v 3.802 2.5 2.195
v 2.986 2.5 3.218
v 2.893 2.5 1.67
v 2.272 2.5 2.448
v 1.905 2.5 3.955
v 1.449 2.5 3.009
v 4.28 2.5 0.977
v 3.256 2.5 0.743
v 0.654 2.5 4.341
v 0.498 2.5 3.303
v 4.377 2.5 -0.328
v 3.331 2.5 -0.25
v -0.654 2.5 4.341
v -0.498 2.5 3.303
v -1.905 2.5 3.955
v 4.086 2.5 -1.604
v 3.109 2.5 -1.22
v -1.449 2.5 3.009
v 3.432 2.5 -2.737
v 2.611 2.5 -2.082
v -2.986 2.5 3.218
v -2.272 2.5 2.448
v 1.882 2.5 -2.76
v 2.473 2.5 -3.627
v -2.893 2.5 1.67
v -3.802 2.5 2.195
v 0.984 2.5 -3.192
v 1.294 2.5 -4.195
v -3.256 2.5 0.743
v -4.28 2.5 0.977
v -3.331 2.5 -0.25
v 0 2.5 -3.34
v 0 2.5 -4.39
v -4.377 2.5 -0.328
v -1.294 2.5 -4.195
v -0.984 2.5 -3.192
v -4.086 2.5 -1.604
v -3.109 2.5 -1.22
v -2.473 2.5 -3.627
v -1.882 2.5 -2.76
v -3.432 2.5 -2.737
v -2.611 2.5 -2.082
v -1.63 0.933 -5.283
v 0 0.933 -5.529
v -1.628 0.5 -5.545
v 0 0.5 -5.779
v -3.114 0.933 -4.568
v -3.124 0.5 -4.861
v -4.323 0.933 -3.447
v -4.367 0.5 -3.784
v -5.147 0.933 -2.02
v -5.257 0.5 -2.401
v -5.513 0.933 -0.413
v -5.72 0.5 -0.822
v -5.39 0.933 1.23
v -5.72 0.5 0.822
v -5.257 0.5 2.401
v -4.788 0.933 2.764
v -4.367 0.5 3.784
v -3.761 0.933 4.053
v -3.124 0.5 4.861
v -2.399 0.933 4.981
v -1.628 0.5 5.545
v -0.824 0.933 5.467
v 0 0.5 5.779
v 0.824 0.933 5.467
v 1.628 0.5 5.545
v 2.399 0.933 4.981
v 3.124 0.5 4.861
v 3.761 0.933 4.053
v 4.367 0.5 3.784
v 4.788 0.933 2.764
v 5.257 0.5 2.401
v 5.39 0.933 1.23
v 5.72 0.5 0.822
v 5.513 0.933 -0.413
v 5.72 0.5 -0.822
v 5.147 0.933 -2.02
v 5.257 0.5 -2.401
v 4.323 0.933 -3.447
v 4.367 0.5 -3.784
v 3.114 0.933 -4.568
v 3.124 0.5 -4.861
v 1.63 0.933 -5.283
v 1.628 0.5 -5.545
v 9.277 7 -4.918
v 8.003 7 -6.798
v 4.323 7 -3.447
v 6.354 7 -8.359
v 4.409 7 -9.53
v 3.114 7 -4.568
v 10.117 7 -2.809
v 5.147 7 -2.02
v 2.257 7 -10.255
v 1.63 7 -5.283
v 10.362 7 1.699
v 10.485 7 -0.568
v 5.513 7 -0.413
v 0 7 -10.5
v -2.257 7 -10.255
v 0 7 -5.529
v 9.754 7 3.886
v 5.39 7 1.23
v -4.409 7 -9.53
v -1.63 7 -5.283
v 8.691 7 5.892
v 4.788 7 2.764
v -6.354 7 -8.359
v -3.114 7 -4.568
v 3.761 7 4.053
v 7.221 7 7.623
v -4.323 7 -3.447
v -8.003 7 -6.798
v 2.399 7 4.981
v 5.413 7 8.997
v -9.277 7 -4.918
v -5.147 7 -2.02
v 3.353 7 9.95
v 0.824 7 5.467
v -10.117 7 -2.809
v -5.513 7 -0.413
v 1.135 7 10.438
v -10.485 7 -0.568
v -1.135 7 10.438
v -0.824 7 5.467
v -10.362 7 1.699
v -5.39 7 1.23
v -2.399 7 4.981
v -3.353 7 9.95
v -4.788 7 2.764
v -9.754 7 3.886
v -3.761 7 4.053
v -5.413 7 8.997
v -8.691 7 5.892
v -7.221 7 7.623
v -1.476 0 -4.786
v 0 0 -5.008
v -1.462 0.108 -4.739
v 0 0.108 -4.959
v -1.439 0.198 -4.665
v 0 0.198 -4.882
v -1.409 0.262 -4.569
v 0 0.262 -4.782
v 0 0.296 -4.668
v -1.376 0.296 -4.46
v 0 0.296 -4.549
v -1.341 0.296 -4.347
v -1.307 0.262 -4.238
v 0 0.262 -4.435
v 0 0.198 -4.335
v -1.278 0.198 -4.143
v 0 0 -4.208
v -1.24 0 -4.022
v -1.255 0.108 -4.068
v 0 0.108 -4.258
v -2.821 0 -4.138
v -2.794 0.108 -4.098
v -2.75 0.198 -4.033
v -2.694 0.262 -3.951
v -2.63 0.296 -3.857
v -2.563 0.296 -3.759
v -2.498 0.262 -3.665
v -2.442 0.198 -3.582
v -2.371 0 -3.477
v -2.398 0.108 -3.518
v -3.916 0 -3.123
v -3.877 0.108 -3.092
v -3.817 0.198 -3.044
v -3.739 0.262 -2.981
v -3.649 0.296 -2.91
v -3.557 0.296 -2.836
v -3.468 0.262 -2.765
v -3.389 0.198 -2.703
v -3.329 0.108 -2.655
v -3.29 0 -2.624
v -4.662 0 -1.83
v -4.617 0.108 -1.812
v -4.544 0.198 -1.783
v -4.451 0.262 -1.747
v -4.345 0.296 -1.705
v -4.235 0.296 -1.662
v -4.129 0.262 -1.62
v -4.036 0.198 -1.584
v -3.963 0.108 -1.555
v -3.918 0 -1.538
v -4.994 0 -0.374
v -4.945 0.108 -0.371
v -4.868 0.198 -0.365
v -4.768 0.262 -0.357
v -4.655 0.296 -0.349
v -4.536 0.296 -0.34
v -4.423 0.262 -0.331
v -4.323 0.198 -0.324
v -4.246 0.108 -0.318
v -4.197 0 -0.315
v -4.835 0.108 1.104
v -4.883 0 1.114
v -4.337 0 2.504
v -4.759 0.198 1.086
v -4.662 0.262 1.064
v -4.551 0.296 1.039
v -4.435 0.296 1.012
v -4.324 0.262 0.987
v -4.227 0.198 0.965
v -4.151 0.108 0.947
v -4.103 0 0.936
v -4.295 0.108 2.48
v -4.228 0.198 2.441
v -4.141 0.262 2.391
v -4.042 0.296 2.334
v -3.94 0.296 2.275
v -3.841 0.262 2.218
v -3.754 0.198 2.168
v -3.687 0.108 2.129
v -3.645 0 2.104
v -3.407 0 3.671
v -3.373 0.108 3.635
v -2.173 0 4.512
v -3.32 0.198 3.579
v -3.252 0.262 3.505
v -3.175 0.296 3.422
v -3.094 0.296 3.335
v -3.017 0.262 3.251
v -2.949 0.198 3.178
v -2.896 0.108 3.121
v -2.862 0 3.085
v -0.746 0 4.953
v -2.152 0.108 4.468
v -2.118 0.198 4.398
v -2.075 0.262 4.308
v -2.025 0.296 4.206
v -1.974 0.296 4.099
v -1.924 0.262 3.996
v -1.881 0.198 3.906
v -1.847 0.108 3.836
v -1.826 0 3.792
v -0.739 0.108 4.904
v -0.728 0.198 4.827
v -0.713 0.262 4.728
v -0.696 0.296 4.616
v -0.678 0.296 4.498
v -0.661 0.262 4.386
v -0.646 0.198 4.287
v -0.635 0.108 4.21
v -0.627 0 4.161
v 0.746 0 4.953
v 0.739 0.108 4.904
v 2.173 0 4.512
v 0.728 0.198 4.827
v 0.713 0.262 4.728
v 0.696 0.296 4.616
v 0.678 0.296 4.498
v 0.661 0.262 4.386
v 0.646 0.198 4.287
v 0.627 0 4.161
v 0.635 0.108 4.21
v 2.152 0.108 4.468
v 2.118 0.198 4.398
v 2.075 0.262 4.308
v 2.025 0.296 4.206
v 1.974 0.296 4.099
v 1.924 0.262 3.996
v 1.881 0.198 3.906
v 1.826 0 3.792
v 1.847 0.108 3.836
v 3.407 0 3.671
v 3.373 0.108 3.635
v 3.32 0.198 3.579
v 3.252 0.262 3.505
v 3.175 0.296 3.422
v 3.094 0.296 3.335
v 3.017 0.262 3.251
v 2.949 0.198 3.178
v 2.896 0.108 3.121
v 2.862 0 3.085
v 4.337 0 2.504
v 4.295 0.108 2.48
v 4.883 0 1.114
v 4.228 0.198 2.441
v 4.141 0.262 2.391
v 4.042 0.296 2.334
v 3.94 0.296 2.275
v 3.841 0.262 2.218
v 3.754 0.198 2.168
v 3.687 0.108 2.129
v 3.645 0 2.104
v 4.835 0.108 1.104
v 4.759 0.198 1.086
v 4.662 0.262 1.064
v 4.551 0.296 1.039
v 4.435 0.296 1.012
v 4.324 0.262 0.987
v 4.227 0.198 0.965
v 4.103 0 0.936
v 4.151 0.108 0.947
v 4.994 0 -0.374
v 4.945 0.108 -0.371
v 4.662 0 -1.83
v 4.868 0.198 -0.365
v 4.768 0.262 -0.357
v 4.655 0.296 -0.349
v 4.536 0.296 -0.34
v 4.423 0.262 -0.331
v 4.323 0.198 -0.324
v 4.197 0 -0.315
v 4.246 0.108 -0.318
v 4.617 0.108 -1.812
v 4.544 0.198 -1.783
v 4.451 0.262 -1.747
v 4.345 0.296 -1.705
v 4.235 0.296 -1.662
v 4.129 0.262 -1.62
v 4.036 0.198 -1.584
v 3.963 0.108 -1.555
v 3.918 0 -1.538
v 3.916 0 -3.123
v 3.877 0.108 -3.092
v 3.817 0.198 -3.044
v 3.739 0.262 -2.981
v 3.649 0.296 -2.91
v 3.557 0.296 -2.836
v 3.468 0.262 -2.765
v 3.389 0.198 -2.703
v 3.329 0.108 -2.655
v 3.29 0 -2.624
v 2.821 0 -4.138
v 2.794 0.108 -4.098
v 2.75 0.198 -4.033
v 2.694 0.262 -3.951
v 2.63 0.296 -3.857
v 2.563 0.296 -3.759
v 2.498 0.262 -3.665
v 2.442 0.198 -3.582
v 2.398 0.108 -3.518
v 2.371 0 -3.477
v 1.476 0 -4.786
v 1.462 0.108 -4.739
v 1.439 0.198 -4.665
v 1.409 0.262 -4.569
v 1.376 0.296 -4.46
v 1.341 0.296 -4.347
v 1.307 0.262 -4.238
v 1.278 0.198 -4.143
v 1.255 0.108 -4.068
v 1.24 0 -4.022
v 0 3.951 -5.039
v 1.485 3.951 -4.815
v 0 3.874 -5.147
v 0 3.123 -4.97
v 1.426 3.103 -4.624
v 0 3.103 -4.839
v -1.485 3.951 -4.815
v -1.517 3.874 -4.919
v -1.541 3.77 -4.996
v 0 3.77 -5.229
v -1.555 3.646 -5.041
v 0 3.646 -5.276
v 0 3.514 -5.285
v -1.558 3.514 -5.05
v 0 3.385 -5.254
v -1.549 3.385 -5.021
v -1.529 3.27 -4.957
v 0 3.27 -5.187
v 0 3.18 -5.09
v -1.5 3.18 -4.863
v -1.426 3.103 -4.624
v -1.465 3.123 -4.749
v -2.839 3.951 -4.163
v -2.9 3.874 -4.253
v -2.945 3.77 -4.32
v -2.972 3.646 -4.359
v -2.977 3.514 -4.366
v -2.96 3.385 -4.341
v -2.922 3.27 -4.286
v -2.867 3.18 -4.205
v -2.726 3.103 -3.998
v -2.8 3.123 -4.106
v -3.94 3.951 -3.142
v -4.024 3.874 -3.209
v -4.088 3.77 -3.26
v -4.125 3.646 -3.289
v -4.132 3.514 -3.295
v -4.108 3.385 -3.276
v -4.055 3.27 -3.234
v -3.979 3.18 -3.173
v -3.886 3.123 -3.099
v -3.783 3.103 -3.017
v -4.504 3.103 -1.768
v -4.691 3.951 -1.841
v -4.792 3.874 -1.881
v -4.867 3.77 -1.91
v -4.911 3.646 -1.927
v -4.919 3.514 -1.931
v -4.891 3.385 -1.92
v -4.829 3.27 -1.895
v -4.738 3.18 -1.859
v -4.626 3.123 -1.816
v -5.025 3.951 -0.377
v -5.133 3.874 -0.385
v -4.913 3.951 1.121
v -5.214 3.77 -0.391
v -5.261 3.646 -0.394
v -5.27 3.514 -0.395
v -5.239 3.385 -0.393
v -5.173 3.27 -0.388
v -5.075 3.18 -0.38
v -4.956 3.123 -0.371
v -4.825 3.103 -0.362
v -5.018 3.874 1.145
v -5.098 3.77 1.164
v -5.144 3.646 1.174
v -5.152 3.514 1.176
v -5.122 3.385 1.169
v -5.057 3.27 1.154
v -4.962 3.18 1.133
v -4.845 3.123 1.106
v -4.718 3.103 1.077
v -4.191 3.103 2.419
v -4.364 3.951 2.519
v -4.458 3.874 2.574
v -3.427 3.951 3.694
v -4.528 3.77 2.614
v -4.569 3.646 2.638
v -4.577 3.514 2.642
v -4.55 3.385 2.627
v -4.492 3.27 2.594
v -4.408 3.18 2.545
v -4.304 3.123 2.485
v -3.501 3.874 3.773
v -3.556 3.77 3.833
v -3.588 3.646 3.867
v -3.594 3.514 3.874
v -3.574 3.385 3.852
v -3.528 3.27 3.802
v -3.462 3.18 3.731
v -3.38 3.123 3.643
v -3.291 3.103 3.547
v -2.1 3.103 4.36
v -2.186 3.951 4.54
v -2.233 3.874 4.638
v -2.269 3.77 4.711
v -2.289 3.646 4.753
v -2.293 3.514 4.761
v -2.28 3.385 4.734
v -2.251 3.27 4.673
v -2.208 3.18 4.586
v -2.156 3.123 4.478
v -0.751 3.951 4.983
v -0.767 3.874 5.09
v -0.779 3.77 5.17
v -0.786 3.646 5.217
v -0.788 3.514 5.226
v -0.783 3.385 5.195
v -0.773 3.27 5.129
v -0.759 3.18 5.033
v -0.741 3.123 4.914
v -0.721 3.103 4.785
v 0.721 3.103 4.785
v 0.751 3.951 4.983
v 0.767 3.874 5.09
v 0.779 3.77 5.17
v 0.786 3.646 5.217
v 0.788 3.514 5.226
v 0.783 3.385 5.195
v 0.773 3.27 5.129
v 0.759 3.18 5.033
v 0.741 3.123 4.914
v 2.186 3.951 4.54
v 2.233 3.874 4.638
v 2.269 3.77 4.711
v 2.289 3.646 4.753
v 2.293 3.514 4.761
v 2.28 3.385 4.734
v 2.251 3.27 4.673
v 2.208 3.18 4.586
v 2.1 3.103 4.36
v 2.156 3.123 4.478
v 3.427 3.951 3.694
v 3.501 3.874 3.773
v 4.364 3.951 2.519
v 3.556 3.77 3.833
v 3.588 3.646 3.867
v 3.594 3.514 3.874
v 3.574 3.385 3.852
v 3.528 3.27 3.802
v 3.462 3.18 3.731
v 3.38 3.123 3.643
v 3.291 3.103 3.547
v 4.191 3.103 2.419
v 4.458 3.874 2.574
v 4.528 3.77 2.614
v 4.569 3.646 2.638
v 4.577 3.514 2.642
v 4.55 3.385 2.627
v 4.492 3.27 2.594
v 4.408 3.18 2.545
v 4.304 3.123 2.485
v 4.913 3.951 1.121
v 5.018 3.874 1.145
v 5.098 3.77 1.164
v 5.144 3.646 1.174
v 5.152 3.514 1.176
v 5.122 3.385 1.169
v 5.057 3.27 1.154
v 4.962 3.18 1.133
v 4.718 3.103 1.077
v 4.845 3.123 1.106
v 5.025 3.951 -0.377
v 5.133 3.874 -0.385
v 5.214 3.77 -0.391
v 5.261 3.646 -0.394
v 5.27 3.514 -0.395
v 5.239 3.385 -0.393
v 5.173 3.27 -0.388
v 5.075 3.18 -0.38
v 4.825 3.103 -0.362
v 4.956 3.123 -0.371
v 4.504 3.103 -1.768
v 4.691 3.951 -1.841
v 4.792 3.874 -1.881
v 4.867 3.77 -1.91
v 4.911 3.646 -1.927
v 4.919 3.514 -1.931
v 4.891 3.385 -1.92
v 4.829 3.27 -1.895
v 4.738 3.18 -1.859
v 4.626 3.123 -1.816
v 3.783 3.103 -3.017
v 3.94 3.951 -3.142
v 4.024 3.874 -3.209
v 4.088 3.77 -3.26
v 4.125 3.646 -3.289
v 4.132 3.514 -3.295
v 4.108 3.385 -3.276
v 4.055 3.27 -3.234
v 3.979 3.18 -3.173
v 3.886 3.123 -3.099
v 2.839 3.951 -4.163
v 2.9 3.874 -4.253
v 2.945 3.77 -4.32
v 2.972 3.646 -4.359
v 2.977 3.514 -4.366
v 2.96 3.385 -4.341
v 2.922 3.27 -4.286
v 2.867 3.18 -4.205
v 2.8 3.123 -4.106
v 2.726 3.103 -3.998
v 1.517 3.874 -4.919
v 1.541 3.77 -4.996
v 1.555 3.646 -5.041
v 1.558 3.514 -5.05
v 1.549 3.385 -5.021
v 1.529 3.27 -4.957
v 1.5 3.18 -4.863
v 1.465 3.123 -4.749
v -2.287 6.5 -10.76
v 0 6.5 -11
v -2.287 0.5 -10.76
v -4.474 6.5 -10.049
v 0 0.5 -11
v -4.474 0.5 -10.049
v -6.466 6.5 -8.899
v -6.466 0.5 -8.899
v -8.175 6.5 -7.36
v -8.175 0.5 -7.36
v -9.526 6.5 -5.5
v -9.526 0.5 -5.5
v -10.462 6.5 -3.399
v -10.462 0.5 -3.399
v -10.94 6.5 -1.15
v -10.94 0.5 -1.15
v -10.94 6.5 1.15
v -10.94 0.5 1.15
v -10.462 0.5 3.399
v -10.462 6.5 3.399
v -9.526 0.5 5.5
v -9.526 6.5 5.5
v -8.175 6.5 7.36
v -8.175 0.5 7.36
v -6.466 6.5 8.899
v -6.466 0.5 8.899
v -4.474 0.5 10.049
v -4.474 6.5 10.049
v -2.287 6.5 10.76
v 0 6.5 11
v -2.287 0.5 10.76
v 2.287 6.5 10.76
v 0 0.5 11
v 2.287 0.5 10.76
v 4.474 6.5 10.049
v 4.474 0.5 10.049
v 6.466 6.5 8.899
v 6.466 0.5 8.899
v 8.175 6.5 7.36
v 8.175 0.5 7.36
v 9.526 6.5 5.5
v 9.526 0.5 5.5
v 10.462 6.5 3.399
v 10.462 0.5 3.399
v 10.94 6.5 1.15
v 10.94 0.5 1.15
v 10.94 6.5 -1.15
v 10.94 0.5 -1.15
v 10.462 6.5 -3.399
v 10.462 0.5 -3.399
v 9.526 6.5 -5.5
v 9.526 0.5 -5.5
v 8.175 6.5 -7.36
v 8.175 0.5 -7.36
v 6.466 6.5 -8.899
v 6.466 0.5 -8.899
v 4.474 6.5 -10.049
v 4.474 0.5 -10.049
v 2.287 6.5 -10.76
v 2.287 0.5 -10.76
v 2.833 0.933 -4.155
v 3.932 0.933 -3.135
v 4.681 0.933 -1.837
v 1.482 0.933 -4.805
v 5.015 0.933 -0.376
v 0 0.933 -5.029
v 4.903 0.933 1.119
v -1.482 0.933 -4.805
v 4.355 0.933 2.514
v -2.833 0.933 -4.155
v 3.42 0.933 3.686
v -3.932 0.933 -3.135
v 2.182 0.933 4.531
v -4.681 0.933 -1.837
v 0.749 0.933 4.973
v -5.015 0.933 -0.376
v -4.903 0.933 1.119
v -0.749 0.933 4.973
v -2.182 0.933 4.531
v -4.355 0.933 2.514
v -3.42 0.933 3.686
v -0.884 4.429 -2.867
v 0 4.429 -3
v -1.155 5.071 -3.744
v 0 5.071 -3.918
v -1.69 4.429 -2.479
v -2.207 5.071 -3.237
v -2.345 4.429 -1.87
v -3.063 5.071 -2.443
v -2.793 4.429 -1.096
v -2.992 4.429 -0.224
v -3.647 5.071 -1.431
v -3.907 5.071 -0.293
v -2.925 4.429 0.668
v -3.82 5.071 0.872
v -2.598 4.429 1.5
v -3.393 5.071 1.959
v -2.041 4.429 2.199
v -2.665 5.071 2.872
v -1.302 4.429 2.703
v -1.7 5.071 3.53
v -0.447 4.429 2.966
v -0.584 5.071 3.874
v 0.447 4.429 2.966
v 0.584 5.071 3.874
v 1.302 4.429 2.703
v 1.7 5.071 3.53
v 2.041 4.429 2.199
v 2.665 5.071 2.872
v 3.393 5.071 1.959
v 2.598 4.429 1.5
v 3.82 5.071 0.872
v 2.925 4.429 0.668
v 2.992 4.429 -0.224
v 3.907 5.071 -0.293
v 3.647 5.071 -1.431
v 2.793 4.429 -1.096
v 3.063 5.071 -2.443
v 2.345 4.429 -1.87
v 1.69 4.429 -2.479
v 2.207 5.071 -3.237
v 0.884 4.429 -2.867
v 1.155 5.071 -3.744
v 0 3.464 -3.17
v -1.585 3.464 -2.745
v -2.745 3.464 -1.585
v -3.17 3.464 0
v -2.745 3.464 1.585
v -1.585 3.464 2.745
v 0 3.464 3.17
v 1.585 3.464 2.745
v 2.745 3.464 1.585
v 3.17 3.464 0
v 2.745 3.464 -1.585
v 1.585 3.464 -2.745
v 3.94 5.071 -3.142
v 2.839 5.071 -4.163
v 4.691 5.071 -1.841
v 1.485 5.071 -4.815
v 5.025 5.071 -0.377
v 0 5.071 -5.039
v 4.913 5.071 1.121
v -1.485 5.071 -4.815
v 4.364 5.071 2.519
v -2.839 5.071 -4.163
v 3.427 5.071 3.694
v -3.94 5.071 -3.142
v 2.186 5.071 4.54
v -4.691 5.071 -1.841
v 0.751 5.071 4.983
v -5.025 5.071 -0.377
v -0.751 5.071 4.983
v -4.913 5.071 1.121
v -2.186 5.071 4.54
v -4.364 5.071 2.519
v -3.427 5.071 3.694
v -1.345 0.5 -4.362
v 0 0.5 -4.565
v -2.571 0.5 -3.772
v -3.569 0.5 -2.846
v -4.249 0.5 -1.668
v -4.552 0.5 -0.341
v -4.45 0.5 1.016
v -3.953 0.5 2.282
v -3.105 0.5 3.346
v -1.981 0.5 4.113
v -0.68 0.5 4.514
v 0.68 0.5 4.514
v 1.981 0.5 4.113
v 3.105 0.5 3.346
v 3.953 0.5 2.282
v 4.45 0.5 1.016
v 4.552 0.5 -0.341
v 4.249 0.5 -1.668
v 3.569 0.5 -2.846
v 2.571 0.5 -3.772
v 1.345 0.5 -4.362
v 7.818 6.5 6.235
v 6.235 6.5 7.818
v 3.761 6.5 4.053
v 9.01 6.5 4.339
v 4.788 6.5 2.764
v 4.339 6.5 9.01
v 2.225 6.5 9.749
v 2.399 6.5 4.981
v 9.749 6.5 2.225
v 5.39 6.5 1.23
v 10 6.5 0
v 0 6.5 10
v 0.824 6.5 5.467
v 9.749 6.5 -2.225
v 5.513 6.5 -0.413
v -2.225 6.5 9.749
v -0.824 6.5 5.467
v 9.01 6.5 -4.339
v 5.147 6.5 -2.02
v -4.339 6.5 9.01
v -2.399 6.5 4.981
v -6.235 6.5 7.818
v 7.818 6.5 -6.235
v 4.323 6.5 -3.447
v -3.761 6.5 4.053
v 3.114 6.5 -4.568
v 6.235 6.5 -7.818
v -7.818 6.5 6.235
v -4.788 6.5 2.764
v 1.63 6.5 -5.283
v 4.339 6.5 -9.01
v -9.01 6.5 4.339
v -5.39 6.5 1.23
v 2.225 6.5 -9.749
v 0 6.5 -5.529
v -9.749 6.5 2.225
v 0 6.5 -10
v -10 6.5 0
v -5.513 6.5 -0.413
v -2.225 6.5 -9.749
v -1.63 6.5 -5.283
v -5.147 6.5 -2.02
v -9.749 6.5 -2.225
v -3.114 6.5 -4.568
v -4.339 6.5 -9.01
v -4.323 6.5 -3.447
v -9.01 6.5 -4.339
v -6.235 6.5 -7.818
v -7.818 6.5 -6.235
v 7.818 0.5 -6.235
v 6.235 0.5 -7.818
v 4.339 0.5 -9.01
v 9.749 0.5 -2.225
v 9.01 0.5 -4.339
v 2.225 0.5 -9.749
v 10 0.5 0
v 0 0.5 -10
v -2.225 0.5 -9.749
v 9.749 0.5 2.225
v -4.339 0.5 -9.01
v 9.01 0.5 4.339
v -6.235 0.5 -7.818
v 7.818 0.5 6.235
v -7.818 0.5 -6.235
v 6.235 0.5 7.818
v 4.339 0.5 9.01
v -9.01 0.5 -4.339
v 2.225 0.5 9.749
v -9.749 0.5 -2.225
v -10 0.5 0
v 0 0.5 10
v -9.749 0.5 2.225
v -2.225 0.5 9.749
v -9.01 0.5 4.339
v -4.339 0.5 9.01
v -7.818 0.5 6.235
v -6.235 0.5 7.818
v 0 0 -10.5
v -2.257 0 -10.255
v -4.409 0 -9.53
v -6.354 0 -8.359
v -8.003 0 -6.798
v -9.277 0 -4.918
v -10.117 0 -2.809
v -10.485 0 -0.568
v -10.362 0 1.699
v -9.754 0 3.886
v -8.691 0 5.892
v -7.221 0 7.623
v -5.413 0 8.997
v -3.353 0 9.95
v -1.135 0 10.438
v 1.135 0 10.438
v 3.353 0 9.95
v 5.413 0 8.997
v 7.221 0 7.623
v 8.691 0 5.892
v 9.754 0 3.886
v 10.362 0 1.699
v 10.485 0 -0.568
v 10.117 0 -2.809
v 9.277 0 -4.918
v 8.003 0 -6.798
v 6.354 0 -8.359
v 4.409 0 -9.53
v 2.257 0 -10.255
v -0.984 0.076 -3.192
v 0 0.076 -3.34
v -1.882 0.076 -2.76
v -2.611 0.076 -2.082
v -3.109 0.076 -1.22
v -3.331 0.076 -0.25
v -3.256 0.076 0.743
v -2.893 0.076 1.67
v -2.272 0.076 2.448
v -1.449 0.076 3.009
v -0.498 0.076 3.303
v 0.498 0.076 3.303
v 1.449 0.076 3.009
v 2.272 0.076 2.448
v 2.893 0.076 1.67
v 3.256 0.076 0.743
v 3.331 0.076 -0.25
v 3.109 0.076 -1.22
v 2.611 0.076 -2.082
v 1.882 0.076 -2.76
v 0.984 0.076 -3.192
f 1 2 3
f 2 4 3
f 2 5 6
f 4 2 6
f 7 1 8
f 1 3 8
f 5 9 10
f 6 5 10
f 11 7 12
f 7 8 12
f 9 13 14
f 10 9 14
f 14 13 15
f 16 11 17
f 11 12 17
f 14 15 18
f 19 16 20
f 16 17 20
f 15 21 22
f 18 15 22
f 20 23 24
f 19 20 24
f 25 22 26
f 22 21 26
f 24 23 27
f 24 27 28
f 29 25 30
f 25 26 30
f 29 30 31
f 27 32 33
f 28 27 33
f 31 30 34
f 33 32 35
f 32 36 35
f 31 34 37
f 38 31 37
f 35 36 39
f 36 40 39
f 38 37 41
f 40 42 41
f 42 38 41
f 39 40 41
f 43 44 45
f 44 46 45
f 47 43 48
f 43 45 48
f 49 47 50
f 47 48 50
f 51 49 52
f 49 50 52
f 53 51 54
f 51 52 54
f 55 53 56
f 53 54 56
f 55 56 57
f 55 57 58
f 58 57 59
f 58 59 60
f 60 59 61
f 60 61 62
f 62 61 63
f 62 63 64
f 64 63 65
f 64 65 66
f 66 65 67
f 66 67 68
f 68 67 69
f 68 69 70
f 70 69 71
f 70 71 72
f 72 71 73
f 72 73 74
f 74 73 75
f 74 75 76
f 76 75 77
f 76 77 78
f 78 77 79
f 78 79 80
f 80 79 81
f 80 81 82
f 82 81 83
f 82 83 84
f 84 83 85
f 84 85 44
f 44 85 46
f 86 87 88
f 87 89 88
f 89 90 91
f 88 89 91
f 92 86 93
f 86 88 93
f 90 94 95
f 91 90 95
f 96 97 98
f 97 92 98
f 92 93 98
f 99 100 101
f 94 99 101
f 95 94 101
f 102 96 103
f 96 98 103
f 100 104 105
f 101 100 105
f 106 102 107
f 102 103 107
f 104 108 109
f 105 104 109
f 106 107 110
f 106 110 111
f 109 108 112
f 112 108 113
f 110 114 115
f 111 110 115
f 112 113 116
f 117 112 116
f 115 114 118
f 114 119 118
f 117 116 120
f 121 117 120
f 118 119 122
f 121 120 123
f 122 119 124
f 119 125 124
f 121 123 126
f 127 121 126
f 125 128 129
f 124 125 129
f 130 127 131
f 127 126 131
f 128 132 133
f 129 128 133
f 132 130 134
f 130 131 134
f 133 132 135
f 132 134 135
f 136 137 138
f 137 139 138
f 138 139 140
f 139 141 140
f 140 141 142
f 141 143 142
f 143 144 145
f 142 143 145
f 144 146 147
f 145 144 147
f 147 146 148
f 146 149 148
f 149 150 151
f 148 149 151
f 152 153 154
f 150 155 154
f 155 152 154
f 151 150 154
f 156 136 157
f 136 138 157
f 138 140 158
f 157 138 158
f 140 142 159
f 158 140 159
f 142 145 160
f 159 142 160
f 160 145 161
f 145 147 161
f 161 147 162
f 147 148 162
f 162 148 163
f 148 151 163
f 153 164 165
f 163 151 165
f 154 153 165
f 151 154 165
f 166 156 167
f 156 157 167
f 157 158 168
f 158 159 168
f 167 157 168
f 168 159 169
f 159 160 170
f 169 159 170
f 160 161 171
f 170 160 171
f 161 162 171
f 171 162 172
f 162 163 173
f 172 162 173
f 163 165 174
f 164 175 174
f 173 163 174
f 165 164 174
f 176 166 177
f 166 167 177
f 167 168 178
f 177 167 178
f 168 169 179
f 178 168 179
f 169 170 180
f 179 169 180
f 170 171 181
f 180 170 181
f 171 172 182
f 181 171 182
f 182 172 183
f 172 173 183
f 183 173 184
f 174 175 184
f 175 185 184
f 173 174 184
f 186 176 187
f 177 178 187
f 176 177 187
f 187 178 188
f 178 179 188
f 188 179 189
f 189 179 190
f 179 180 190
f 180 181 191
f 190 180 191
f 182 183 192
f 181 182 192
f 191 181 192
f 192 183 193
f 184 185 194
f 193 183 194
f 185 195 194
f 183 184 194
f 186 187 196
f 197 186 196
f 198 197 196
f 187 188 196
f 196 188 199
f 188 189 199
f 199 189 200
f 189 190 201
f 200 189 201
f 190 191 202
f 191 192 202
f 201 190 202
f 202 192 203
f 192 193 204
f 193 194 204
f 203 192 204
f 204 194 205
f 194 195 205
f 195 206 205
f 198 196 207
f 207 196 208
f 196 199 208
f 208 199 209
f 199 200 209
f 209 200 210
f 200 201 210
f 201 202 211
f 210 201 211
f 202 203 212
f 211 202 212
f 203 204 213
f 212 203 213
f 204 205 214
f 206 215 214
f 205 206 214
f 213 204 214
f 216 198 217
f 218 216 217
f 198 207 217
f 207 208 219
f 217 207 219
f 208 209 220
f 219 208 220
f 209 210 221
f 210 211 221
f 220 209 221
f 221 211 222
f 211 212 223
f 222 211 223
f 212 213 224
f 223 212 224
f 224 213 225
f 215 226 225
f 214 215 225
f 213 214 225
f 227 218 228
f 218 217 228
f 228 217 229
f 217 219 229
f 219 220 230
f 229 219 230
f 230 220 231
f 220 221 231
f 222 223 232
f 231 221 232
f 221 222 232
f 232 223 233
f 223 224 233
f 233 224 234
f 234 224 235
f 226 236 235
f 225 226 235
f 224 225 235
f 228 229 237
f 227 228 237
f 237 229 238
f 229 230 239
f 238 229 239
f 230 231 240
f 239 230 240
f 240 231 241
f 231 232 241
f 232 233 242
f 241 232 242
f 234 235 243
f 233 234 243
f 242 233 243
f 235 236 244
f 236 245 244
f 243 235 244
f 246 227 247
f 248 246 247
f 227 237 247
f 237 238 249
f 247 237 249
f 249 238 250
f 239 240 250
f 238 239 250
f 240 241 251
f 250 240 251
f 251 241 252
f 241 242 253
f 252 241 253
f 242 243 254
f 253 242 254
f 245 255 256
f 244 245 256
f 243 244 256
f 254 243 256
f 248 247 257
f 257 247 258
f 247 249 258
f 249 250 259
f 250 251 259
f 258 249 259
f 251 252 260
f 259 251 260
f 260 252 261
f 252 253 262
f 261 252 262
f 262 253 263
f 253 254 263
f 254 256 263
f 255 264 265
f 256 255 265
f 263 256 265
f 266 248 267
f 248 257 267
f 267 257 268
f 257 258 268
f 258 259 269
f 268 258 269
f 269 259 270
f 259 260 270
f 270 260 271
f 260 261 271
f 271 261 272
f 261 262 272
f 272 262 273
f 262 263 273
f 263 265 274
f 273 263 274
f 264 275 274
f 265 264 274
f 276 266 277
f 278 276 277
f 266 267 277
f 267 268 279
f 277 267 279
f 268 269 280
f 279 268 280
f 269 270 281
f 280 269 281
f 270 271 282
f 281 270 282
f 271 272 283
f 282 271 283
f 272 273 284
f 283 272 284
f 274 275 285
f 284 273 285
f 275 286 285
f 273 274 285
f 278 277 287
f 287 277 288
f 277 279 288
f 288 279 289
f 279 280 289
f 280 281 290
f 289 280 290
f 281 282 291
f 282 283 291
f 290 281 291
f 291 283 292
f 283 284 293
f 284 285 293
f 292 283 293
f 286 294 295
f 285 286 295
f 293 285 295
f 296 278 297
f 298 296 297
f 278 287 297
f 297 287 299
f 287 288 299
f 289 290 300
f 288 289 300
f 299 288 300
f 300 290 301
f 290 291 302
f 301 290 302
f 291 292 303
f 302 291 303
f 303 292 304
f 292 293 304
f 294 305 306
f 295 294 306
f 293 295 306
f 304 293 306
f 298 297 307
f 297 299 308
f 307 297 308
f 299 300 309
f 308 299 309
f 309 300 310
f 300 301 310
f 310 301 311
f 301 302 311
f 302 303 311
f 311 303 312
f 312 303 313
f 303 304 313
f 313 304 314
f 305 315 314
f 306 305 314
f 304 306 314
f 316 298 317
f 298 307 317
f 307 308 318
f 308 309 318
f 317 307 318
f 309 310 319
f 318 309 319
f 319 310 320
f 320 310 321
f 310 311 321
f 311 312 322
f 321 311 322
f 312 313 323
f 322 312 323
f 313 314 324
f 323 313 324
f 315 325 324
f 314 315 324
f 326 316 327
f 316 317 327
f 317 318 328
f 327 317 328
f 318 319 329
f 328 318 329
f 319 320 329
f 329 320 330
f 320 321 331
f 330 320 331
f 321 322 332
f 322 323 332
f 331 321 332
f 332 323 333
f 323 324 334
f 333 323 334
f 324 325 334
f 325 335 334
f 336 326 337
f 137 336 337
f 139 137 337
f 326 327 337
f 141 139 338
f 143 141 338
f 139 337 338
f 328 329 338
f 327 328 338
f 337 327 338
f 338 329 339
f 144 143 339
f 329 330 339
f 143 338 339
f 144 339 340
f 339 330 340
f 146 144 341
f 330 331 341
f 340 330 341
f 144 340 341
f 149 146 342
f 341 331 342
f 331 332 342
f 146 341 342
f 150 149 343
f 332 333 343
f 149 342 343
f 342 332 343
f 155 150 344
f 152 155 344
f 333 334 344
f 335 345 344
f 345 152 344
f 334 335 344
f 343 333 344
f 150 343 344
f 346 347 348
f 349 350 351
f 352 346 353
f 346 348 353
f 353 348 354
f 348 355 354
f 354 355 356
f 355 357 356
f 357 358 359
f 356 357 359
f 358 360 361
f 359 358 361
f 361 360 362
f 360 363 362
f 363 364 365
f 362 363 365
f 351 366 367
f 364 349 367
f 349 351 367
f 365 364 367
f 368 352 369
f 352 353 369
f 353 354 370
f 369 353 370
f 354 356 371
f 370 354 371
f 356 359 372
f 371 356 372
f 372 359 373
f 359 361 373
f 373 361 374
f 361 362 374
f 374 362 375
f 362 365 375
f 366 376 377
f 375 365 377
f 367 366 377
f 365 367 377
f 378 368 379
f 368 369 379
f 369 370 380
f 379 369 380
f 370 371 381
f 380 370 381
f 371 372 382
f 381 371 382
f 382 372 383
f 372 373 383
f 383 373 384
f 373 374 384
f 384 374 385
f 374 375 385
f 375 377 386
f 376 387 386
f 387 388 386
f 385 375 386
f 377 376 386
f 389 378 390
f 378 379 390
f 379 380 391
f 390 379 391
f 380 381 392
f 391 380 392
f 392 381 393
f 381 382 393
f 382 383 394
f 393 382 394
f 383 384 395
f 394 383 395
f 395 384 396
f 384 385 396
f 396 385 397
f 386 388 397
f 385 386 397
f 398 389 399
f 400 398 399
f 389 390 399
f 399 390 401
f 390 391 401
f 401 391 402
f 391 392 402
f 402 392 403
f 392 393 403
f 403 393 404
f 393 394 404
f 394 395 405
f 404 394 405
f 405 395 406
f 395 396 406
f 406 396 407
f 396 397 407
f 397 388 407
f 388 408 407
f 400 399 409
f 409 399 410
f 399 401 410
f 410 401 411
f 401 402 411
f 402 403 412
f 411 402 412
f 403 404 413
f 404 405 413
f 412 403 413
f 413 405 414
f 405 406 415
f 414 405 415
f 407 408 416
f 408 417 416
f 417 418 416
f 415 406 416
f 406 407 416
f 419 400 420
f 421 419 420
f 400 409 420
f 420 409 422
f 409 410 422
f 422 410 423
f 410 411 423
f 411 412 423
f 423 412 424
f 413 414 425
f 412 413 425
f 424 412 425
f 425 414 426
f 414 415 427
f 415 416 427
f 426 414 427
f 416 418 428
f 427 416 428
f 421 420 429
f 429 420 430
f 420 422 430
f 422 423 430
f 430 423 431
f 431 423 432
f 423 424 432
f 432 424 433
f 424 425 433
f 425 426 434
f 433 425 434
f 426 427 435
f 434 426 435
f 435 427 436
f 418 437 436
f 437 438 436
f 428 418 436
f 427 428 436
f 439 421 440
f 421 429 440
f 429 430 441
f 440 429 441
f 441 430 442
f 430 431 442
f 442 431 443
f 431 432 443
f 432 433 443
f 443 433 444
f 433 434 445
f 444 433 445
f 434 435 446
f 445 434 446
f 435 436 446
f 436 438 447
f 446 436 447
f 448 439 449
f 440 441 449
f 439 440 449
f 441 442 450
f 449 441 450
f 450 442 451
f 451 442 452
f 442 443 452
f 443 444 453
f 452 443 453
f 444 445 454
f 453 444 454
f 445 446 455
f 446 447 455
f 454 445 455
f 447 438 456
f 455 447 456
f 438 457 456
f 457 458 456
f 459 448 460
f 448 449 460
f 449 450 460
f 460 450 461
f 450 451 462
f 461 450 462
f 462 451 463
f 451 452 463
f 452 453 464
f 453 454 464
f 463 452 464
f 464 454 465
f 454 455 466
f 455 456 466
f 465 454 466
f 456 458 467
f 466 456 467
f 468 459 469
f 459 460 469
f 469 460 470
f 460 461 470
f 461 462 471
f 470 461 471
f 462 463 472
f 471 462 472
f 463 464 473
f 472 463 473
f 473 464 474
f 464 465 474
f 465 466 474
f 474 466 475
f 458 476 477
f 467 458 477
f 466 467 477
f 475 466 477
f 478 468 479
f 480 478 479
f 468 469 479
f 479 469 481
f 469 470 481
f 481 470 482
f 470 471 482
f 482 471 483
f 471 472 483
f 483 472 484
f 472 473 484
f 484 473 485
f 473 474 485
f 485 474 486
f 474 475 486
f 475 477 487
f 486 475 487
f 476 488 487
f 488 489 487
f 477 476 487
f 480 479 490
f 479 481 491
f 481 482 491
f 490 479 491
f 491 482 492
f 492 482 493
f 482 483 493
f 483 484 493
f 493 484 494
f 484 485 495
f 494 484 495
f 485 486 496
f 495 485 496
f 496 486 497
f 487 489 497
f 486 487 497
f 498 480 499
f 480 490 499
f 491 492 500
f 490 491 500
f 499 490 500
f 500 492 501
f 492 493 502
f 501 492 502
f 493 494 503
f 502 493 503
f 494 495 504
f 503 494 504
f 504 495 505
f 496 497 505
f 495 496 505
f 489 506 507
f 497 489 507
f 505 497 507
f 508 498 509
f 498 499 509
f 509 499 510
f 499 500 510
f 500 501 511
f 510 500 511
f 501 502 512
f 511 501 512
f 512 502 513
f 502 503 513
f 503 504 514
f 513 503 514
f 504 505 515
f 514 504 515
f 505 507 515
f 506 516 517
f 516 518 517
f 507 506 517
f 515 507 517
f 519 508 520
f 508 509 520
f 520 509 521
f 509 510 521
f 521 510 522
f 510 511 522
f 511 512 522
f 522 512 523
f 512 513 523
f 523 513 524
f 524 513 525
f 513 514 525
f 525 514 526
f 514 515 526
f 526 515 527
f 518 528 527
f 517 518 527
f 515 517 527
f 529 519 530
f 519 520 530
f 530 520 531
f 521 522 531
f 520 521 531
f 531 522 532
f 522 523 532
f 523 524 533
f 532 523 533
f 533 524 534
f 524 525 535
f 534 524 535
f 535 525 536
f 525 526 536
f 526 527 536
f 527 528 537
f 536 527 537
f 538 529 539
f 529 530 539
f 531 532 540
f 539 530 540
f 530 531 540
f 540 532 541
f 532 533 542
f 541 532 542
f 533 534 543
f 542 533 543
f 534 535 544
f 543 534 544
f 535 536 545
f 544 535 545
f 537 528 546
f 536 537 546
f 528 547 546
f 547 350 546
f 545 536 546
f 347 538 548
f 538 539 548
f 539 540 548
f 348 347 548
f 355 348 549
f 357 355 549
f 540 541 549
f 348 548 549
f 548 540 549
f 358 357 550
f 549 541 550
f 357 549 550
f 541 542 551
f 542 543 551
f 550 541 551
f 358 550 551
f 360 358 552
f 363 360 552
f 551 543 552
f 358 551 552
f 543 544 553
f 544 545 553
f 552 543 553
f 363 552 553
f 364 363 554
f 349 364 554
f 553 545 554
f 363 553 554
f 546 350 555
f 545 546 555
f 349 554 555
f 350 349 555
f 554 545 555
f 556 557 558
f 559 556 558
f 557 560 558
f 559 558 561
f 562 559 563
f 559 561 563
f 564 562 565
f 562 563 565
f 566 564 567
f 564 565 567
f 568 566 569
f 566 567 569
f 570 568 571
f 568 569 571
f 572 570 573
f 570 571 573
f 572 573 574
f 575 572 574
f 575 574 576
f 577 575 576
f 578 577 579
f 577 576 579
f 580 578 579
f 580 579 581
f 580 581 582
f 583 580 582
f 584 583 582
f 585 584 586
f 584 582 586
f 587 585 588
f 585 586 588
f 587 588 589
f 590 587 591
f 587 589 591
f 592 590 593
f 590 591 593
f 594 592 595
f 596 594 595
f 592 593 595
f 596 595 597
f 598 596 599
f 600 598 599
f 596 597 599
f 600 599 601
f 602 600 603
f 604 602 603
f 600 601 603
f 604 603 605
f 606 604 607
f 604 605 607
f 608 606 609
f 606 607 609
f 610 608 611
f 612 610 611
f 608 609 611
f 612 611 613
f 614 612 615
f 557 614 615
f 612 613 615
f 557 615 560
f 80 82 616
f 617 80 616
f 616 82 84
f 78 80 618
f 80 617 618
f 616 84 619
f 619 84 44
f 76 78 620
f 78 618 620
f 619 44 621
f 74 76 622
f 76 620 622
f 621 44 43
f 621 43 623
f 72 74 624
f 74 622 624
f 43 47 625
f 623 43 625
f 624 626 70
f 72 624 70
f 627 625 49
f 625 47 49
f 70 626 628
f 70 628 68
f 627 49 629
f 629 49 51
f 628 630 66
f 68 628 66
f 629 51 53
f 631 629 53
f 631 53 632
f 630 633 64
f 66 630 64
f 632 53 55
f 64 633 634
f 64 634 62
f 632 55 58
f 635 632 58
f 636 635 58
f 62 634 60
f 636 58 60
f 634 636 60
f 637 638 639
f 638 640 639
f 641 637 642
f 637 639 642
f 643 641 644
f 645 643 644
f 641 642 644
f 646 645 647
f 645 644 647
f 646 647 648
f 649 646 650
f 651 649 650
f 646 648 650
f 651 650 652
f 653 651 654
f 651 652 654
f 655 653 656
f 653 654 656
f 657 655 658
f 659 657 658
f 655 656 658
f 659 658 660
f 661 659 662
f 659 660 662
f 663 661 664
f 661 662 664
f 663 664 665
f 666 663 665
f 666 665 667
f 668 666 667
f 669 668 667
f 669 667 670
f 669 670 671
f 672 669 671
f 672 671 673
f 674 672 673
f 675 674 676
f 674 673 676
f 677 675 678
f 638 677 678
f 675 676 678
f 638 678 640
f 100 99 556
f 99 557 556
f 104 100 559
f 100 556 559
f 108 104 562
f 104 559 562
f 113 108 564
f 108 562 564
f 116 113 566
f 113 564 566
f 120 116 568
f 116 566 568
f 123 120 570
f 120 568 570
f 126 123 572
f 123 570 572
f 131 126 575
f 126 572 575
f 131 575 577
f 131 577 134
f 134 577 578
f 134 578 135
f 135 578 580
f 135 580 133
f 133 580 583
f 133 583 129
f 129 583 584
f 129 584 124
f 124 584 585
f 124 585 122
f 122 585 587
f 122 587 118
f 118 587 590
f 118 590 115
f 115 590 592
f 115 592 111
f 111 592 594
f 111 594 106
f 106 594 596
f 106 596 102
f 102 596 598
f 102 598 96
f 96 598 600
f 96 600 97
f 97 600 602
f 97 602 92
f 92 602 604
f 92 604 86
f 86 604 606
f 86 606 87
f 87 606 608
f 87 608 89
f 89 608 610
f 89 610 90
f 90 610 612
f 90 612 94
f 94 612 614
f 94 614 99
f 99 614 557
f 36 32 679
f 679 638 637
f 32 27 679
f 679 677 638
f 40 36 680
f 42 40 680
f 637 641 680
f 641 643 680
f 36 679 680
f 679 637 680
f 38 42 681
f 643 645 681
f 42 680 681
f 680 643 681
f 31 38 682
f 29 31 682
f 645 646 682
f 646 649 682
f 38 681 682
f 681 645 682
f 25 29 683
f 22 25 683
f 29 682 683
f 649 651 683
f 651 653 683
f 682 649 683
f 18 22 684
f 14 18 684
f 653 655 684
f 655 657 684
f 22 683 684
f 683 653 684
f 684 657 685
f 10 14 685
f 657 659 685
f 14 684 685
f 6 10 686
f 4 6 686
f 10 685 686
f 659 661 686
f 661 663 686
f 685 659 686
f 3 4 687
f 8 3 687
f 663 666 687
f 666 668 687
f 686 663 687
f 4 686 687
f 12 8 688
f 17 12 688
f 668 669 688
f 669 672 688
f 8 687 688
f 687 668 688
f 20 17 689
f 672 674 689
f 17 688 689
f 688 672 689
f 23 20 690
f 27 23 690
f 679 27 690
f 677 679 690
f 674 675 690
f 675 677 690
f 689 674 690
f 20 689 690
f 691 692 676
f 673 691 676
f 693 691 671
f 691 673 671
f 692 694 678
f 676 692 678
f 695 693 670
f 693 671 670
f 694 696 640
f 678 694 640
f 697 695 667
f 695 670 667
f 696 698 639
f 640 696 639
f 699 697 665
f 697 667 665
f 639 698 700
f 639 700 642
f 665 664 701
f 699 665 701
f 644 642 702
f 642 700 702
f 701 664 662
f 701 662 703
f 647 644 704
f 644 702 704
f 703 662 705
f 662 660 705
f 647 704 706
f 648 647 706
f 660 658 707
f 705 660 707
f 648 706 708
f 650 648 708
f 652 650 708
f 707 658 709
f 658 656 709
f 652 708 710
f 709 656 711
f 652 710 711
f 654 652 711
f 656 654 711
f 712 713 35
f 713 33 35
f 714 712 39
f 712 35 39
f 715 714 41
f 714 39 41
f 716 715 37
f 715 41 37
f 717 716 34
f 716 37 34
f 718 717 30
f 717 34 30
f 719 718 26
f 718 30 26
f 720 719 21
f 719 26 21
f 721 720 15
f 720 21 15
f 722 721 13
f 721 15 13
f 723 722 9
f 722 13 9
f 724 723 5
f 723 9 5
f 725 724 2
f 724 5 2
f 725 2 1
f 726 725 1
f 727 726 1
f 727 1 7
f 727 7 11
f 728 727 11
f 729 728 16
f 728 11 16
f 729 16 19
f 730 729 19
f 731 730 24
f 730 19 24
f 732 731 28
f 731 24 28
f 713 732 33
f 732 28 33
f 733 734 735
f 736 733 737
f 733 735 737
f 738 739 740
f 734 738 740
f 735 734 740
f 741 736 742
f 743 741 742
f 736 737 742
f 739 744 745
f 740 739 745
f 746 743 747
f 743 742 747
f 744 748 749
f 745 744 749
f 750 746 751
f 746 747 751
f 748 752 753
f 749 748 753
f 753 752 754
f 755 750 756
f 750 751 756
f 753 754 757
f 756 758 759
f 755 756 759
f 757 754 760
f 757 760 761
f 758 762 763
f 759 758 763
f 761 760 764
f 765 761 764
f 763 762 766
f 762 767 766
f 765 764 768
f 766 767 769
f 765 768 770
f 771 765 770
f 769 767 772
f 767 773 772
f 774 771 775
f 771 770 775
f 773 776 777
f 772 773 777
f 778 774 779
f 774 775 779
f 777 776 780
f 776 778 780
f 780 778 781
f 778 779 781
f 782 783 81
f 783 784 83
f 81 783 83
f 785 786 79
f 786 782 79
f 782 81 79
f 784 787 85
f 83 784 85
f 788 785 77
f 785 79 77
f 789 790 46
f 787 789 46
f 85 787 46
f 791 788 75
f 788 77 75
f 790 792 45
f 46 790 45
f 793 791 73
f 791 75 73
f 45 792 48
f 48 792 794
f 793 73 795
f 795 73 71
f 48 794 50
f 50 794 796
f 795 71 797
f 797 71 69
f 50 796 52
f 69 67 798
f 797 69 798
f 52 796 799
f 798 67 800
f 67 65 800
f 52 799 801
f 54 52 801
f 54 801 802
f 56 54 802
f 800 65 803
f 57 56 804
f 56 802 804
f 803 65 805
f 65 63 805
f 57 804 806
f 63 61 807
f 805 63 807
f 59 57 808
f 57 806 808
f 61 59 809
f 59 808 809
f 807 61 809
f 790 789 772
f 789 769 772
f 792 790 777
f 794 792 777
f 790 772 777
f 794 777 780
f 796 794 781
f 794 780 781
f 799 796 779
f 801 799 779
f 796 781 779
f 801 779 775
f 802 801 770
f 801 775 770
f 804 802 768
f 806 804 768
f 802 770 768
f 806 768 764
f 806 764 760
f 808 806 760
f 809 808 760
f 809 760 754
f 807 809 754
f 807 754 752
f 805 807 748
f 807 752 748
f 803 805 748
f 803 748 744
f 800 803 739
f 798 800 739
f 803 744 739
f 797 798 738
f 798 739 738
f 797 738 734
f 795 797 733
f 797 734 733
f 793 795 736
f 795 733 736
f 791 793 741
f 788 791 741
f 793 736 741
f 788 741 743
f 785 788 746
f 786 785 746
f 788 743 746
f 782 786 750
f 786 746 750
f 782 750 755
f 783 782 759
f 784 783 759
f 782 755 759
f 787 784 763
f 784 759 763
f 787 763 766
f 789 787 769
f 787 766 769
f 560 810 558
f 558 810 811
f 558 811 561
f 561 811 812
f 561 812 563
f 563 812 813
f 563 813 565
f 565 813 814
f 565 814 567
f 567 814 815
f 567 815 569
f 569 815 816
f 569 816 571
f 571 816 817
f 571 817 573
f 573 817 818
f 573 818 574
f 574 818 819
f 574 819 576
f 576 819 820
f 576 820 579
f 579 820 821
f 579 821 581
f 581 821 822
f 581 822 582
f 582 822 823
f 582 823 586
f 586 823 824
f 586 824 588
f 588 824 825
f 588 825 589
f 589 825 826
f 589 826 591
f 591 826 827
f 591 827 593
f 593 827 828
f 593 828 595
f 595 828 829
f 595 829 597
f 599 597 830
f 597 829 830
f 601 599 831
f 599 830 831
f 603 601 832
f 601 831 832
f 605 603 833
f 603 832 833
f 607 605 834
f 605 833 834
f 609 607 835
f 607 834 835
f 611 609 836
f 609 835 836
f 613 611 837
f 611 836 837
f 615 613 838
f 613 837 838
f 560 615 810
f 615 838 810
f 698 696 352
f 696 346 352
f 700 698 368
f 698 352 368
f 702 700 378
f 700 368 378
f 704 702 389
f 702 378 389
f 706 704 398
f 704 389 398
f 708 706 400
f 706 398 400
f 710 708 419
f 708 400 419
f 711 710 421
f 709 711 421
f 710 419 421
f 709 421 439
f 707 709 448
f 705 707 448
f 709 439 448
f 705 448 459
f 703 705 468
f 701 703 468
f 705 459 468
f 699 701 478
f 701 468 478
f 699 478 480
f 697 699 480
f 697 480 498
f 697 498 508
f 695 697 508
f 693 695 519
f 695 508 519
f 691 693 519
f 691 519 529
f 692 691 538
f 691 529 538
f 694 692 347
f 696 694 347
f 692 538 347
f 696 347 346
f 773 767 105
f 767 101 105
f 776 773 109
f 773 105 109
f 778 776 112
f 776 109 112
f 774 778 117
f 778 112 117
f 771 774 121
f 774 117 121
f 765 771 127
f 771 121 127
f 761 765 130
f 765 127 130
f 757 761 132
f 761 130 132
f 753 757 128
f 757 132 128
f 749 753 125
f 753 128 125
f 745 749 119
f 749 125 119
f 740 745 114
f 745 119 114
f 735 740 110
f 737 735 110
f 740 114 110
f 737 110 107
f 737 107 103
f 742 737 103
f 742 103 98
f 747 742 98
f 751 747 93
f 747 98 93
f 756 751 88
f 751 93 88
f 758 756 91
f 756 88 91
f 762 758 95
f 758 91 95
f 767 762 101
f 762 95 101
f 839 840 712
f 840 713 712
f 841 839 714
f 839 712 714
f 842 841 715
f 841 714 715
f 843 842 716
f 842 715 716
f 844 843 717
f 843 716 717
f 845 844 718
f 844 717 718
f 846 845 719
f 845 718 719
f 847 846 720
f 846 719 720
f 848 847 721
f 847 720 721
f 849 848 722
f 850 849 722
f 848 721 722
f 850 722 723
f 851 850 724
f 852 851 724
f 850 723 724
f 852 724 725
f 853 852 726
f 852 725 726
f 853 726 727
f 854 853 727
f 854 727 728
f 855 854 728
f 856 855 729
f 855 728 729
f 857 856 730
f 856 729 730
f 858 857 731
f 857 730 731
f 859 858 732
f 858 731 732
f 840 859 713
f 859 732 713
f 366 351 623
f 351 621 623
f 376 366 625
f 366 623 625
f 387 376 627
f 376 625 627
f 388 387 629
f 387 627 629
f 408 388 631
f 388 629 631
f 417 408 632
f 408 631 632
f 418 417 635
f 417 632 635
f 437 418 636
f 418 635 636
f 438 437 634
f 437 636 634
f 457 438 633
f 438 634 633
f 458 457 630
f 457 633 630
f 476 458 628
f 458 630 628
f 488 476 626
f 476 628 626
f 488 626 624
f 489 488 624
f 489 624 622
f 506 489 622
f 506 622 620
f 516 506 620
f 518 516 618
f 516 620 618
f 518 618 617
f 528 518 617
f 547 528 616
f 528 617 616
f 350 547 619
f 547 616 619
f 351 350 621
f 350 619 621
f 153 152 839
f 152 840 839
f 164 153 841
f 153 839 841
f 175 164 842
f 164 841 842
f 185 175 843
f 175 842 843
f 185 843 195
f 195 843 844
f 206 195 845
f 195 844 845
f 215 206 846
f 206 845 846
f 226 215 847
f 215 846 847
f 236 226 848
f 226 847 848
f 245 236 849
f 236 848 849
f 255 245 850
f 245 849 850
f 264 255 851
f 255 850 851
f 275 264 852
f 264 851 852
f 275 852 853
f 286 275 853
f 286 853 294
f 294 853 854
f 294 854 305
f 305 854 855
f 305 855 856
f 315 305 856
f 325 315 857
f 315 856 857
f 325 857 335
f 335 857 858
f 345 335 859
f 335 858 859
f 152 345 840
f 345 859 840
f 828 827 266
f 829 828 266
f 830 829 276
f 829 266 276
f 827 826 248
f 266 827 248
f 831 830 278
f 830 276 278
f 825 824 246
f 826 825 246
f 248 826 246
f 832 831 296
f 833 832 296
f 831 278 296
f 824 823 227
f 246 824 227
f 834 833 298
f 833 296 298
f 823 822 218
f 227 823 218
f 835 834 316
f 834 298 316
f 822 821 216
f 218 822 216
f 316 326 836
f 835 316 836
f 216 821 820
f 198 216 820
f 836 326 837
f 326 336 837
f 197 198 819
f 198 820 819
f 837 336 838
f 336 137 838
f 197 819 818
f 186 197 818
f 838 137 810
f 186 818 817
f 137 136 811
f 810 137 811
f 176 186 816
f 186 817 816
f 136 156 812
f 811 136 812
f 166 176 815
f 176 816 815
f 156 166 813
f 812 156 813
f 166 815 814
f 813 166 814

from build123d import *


with BuildPart() as part:
    # 草图1 → 旋转1 (revolve)
    with BuildSketch(Plane.XY, mode=Mode.PRIVATE) as revolve_1_sk:
        with BuildLine():
            Line((-4.838882373, 3.10342775), (-5.028769085, 0.933012702))
            Line((-5.028769085, 0.933012702), (-5.528769085, 0.933012702))
            Line((-5.528769085, 0.933012702), (-5.778769085, 0.5))
            Line((-5.778769085, 0.5), (-10, 0.5))
            Line((-10, 0.5), (-10, 6.5))
            Line((-10, 6.5), (-5.528769085, 6.5))
            Line((-5.528769085, 6.5), (-5.528769085, 7))
            Line((-5.528769085, 7), (-10.5, 7))
            Line((-10.5, 7), (-11, 6.5))
            Line((-11, 6.5), (-11, 0.5))
            Line((-11, 0.5), (-10.5, 0))
            Line((-10.5, 0), (-5.0084872, 0))
            ThreePointArc((-5.0084872, 0), (-4.6084872, 0.3), (-4.2084872, 0))
            Line((-4.2084872, 0), (-3.340059177, 0.075977607))
            Line((-3.340059177, 0.075977607), (-4.564742869, 0.5))
            Line((-4.564742869, 0.5), (-4.389765542, 2.5))
            Line((-4.389765542, 2.5), (-3.340059177, 2.5))
            Line((-3.340059177, 2.5), (-3, 4.428571429))
            Line((-3, 4.428571429), (-3.918095147, 5.071428571))
            Line((-3.918095147, 5.071428571), (-5.038882373, 5.071428571))
            Line((-5.038882373, 5.071428571), (-5.038882373, 3.950641346))
            ThreePointArc((-5.038882373, 3.950641346), (-5.274132553, 3.447892716), (-4.838882373, 3.10342775))
        make_face()
    revolve(revolve_1_sk.sketch.rotate(Axis((0, 0, 0), (0, 1, 0)), 270), axis=Axis((0, 0, 0), (0, 1, 0)))


solid = part.part
